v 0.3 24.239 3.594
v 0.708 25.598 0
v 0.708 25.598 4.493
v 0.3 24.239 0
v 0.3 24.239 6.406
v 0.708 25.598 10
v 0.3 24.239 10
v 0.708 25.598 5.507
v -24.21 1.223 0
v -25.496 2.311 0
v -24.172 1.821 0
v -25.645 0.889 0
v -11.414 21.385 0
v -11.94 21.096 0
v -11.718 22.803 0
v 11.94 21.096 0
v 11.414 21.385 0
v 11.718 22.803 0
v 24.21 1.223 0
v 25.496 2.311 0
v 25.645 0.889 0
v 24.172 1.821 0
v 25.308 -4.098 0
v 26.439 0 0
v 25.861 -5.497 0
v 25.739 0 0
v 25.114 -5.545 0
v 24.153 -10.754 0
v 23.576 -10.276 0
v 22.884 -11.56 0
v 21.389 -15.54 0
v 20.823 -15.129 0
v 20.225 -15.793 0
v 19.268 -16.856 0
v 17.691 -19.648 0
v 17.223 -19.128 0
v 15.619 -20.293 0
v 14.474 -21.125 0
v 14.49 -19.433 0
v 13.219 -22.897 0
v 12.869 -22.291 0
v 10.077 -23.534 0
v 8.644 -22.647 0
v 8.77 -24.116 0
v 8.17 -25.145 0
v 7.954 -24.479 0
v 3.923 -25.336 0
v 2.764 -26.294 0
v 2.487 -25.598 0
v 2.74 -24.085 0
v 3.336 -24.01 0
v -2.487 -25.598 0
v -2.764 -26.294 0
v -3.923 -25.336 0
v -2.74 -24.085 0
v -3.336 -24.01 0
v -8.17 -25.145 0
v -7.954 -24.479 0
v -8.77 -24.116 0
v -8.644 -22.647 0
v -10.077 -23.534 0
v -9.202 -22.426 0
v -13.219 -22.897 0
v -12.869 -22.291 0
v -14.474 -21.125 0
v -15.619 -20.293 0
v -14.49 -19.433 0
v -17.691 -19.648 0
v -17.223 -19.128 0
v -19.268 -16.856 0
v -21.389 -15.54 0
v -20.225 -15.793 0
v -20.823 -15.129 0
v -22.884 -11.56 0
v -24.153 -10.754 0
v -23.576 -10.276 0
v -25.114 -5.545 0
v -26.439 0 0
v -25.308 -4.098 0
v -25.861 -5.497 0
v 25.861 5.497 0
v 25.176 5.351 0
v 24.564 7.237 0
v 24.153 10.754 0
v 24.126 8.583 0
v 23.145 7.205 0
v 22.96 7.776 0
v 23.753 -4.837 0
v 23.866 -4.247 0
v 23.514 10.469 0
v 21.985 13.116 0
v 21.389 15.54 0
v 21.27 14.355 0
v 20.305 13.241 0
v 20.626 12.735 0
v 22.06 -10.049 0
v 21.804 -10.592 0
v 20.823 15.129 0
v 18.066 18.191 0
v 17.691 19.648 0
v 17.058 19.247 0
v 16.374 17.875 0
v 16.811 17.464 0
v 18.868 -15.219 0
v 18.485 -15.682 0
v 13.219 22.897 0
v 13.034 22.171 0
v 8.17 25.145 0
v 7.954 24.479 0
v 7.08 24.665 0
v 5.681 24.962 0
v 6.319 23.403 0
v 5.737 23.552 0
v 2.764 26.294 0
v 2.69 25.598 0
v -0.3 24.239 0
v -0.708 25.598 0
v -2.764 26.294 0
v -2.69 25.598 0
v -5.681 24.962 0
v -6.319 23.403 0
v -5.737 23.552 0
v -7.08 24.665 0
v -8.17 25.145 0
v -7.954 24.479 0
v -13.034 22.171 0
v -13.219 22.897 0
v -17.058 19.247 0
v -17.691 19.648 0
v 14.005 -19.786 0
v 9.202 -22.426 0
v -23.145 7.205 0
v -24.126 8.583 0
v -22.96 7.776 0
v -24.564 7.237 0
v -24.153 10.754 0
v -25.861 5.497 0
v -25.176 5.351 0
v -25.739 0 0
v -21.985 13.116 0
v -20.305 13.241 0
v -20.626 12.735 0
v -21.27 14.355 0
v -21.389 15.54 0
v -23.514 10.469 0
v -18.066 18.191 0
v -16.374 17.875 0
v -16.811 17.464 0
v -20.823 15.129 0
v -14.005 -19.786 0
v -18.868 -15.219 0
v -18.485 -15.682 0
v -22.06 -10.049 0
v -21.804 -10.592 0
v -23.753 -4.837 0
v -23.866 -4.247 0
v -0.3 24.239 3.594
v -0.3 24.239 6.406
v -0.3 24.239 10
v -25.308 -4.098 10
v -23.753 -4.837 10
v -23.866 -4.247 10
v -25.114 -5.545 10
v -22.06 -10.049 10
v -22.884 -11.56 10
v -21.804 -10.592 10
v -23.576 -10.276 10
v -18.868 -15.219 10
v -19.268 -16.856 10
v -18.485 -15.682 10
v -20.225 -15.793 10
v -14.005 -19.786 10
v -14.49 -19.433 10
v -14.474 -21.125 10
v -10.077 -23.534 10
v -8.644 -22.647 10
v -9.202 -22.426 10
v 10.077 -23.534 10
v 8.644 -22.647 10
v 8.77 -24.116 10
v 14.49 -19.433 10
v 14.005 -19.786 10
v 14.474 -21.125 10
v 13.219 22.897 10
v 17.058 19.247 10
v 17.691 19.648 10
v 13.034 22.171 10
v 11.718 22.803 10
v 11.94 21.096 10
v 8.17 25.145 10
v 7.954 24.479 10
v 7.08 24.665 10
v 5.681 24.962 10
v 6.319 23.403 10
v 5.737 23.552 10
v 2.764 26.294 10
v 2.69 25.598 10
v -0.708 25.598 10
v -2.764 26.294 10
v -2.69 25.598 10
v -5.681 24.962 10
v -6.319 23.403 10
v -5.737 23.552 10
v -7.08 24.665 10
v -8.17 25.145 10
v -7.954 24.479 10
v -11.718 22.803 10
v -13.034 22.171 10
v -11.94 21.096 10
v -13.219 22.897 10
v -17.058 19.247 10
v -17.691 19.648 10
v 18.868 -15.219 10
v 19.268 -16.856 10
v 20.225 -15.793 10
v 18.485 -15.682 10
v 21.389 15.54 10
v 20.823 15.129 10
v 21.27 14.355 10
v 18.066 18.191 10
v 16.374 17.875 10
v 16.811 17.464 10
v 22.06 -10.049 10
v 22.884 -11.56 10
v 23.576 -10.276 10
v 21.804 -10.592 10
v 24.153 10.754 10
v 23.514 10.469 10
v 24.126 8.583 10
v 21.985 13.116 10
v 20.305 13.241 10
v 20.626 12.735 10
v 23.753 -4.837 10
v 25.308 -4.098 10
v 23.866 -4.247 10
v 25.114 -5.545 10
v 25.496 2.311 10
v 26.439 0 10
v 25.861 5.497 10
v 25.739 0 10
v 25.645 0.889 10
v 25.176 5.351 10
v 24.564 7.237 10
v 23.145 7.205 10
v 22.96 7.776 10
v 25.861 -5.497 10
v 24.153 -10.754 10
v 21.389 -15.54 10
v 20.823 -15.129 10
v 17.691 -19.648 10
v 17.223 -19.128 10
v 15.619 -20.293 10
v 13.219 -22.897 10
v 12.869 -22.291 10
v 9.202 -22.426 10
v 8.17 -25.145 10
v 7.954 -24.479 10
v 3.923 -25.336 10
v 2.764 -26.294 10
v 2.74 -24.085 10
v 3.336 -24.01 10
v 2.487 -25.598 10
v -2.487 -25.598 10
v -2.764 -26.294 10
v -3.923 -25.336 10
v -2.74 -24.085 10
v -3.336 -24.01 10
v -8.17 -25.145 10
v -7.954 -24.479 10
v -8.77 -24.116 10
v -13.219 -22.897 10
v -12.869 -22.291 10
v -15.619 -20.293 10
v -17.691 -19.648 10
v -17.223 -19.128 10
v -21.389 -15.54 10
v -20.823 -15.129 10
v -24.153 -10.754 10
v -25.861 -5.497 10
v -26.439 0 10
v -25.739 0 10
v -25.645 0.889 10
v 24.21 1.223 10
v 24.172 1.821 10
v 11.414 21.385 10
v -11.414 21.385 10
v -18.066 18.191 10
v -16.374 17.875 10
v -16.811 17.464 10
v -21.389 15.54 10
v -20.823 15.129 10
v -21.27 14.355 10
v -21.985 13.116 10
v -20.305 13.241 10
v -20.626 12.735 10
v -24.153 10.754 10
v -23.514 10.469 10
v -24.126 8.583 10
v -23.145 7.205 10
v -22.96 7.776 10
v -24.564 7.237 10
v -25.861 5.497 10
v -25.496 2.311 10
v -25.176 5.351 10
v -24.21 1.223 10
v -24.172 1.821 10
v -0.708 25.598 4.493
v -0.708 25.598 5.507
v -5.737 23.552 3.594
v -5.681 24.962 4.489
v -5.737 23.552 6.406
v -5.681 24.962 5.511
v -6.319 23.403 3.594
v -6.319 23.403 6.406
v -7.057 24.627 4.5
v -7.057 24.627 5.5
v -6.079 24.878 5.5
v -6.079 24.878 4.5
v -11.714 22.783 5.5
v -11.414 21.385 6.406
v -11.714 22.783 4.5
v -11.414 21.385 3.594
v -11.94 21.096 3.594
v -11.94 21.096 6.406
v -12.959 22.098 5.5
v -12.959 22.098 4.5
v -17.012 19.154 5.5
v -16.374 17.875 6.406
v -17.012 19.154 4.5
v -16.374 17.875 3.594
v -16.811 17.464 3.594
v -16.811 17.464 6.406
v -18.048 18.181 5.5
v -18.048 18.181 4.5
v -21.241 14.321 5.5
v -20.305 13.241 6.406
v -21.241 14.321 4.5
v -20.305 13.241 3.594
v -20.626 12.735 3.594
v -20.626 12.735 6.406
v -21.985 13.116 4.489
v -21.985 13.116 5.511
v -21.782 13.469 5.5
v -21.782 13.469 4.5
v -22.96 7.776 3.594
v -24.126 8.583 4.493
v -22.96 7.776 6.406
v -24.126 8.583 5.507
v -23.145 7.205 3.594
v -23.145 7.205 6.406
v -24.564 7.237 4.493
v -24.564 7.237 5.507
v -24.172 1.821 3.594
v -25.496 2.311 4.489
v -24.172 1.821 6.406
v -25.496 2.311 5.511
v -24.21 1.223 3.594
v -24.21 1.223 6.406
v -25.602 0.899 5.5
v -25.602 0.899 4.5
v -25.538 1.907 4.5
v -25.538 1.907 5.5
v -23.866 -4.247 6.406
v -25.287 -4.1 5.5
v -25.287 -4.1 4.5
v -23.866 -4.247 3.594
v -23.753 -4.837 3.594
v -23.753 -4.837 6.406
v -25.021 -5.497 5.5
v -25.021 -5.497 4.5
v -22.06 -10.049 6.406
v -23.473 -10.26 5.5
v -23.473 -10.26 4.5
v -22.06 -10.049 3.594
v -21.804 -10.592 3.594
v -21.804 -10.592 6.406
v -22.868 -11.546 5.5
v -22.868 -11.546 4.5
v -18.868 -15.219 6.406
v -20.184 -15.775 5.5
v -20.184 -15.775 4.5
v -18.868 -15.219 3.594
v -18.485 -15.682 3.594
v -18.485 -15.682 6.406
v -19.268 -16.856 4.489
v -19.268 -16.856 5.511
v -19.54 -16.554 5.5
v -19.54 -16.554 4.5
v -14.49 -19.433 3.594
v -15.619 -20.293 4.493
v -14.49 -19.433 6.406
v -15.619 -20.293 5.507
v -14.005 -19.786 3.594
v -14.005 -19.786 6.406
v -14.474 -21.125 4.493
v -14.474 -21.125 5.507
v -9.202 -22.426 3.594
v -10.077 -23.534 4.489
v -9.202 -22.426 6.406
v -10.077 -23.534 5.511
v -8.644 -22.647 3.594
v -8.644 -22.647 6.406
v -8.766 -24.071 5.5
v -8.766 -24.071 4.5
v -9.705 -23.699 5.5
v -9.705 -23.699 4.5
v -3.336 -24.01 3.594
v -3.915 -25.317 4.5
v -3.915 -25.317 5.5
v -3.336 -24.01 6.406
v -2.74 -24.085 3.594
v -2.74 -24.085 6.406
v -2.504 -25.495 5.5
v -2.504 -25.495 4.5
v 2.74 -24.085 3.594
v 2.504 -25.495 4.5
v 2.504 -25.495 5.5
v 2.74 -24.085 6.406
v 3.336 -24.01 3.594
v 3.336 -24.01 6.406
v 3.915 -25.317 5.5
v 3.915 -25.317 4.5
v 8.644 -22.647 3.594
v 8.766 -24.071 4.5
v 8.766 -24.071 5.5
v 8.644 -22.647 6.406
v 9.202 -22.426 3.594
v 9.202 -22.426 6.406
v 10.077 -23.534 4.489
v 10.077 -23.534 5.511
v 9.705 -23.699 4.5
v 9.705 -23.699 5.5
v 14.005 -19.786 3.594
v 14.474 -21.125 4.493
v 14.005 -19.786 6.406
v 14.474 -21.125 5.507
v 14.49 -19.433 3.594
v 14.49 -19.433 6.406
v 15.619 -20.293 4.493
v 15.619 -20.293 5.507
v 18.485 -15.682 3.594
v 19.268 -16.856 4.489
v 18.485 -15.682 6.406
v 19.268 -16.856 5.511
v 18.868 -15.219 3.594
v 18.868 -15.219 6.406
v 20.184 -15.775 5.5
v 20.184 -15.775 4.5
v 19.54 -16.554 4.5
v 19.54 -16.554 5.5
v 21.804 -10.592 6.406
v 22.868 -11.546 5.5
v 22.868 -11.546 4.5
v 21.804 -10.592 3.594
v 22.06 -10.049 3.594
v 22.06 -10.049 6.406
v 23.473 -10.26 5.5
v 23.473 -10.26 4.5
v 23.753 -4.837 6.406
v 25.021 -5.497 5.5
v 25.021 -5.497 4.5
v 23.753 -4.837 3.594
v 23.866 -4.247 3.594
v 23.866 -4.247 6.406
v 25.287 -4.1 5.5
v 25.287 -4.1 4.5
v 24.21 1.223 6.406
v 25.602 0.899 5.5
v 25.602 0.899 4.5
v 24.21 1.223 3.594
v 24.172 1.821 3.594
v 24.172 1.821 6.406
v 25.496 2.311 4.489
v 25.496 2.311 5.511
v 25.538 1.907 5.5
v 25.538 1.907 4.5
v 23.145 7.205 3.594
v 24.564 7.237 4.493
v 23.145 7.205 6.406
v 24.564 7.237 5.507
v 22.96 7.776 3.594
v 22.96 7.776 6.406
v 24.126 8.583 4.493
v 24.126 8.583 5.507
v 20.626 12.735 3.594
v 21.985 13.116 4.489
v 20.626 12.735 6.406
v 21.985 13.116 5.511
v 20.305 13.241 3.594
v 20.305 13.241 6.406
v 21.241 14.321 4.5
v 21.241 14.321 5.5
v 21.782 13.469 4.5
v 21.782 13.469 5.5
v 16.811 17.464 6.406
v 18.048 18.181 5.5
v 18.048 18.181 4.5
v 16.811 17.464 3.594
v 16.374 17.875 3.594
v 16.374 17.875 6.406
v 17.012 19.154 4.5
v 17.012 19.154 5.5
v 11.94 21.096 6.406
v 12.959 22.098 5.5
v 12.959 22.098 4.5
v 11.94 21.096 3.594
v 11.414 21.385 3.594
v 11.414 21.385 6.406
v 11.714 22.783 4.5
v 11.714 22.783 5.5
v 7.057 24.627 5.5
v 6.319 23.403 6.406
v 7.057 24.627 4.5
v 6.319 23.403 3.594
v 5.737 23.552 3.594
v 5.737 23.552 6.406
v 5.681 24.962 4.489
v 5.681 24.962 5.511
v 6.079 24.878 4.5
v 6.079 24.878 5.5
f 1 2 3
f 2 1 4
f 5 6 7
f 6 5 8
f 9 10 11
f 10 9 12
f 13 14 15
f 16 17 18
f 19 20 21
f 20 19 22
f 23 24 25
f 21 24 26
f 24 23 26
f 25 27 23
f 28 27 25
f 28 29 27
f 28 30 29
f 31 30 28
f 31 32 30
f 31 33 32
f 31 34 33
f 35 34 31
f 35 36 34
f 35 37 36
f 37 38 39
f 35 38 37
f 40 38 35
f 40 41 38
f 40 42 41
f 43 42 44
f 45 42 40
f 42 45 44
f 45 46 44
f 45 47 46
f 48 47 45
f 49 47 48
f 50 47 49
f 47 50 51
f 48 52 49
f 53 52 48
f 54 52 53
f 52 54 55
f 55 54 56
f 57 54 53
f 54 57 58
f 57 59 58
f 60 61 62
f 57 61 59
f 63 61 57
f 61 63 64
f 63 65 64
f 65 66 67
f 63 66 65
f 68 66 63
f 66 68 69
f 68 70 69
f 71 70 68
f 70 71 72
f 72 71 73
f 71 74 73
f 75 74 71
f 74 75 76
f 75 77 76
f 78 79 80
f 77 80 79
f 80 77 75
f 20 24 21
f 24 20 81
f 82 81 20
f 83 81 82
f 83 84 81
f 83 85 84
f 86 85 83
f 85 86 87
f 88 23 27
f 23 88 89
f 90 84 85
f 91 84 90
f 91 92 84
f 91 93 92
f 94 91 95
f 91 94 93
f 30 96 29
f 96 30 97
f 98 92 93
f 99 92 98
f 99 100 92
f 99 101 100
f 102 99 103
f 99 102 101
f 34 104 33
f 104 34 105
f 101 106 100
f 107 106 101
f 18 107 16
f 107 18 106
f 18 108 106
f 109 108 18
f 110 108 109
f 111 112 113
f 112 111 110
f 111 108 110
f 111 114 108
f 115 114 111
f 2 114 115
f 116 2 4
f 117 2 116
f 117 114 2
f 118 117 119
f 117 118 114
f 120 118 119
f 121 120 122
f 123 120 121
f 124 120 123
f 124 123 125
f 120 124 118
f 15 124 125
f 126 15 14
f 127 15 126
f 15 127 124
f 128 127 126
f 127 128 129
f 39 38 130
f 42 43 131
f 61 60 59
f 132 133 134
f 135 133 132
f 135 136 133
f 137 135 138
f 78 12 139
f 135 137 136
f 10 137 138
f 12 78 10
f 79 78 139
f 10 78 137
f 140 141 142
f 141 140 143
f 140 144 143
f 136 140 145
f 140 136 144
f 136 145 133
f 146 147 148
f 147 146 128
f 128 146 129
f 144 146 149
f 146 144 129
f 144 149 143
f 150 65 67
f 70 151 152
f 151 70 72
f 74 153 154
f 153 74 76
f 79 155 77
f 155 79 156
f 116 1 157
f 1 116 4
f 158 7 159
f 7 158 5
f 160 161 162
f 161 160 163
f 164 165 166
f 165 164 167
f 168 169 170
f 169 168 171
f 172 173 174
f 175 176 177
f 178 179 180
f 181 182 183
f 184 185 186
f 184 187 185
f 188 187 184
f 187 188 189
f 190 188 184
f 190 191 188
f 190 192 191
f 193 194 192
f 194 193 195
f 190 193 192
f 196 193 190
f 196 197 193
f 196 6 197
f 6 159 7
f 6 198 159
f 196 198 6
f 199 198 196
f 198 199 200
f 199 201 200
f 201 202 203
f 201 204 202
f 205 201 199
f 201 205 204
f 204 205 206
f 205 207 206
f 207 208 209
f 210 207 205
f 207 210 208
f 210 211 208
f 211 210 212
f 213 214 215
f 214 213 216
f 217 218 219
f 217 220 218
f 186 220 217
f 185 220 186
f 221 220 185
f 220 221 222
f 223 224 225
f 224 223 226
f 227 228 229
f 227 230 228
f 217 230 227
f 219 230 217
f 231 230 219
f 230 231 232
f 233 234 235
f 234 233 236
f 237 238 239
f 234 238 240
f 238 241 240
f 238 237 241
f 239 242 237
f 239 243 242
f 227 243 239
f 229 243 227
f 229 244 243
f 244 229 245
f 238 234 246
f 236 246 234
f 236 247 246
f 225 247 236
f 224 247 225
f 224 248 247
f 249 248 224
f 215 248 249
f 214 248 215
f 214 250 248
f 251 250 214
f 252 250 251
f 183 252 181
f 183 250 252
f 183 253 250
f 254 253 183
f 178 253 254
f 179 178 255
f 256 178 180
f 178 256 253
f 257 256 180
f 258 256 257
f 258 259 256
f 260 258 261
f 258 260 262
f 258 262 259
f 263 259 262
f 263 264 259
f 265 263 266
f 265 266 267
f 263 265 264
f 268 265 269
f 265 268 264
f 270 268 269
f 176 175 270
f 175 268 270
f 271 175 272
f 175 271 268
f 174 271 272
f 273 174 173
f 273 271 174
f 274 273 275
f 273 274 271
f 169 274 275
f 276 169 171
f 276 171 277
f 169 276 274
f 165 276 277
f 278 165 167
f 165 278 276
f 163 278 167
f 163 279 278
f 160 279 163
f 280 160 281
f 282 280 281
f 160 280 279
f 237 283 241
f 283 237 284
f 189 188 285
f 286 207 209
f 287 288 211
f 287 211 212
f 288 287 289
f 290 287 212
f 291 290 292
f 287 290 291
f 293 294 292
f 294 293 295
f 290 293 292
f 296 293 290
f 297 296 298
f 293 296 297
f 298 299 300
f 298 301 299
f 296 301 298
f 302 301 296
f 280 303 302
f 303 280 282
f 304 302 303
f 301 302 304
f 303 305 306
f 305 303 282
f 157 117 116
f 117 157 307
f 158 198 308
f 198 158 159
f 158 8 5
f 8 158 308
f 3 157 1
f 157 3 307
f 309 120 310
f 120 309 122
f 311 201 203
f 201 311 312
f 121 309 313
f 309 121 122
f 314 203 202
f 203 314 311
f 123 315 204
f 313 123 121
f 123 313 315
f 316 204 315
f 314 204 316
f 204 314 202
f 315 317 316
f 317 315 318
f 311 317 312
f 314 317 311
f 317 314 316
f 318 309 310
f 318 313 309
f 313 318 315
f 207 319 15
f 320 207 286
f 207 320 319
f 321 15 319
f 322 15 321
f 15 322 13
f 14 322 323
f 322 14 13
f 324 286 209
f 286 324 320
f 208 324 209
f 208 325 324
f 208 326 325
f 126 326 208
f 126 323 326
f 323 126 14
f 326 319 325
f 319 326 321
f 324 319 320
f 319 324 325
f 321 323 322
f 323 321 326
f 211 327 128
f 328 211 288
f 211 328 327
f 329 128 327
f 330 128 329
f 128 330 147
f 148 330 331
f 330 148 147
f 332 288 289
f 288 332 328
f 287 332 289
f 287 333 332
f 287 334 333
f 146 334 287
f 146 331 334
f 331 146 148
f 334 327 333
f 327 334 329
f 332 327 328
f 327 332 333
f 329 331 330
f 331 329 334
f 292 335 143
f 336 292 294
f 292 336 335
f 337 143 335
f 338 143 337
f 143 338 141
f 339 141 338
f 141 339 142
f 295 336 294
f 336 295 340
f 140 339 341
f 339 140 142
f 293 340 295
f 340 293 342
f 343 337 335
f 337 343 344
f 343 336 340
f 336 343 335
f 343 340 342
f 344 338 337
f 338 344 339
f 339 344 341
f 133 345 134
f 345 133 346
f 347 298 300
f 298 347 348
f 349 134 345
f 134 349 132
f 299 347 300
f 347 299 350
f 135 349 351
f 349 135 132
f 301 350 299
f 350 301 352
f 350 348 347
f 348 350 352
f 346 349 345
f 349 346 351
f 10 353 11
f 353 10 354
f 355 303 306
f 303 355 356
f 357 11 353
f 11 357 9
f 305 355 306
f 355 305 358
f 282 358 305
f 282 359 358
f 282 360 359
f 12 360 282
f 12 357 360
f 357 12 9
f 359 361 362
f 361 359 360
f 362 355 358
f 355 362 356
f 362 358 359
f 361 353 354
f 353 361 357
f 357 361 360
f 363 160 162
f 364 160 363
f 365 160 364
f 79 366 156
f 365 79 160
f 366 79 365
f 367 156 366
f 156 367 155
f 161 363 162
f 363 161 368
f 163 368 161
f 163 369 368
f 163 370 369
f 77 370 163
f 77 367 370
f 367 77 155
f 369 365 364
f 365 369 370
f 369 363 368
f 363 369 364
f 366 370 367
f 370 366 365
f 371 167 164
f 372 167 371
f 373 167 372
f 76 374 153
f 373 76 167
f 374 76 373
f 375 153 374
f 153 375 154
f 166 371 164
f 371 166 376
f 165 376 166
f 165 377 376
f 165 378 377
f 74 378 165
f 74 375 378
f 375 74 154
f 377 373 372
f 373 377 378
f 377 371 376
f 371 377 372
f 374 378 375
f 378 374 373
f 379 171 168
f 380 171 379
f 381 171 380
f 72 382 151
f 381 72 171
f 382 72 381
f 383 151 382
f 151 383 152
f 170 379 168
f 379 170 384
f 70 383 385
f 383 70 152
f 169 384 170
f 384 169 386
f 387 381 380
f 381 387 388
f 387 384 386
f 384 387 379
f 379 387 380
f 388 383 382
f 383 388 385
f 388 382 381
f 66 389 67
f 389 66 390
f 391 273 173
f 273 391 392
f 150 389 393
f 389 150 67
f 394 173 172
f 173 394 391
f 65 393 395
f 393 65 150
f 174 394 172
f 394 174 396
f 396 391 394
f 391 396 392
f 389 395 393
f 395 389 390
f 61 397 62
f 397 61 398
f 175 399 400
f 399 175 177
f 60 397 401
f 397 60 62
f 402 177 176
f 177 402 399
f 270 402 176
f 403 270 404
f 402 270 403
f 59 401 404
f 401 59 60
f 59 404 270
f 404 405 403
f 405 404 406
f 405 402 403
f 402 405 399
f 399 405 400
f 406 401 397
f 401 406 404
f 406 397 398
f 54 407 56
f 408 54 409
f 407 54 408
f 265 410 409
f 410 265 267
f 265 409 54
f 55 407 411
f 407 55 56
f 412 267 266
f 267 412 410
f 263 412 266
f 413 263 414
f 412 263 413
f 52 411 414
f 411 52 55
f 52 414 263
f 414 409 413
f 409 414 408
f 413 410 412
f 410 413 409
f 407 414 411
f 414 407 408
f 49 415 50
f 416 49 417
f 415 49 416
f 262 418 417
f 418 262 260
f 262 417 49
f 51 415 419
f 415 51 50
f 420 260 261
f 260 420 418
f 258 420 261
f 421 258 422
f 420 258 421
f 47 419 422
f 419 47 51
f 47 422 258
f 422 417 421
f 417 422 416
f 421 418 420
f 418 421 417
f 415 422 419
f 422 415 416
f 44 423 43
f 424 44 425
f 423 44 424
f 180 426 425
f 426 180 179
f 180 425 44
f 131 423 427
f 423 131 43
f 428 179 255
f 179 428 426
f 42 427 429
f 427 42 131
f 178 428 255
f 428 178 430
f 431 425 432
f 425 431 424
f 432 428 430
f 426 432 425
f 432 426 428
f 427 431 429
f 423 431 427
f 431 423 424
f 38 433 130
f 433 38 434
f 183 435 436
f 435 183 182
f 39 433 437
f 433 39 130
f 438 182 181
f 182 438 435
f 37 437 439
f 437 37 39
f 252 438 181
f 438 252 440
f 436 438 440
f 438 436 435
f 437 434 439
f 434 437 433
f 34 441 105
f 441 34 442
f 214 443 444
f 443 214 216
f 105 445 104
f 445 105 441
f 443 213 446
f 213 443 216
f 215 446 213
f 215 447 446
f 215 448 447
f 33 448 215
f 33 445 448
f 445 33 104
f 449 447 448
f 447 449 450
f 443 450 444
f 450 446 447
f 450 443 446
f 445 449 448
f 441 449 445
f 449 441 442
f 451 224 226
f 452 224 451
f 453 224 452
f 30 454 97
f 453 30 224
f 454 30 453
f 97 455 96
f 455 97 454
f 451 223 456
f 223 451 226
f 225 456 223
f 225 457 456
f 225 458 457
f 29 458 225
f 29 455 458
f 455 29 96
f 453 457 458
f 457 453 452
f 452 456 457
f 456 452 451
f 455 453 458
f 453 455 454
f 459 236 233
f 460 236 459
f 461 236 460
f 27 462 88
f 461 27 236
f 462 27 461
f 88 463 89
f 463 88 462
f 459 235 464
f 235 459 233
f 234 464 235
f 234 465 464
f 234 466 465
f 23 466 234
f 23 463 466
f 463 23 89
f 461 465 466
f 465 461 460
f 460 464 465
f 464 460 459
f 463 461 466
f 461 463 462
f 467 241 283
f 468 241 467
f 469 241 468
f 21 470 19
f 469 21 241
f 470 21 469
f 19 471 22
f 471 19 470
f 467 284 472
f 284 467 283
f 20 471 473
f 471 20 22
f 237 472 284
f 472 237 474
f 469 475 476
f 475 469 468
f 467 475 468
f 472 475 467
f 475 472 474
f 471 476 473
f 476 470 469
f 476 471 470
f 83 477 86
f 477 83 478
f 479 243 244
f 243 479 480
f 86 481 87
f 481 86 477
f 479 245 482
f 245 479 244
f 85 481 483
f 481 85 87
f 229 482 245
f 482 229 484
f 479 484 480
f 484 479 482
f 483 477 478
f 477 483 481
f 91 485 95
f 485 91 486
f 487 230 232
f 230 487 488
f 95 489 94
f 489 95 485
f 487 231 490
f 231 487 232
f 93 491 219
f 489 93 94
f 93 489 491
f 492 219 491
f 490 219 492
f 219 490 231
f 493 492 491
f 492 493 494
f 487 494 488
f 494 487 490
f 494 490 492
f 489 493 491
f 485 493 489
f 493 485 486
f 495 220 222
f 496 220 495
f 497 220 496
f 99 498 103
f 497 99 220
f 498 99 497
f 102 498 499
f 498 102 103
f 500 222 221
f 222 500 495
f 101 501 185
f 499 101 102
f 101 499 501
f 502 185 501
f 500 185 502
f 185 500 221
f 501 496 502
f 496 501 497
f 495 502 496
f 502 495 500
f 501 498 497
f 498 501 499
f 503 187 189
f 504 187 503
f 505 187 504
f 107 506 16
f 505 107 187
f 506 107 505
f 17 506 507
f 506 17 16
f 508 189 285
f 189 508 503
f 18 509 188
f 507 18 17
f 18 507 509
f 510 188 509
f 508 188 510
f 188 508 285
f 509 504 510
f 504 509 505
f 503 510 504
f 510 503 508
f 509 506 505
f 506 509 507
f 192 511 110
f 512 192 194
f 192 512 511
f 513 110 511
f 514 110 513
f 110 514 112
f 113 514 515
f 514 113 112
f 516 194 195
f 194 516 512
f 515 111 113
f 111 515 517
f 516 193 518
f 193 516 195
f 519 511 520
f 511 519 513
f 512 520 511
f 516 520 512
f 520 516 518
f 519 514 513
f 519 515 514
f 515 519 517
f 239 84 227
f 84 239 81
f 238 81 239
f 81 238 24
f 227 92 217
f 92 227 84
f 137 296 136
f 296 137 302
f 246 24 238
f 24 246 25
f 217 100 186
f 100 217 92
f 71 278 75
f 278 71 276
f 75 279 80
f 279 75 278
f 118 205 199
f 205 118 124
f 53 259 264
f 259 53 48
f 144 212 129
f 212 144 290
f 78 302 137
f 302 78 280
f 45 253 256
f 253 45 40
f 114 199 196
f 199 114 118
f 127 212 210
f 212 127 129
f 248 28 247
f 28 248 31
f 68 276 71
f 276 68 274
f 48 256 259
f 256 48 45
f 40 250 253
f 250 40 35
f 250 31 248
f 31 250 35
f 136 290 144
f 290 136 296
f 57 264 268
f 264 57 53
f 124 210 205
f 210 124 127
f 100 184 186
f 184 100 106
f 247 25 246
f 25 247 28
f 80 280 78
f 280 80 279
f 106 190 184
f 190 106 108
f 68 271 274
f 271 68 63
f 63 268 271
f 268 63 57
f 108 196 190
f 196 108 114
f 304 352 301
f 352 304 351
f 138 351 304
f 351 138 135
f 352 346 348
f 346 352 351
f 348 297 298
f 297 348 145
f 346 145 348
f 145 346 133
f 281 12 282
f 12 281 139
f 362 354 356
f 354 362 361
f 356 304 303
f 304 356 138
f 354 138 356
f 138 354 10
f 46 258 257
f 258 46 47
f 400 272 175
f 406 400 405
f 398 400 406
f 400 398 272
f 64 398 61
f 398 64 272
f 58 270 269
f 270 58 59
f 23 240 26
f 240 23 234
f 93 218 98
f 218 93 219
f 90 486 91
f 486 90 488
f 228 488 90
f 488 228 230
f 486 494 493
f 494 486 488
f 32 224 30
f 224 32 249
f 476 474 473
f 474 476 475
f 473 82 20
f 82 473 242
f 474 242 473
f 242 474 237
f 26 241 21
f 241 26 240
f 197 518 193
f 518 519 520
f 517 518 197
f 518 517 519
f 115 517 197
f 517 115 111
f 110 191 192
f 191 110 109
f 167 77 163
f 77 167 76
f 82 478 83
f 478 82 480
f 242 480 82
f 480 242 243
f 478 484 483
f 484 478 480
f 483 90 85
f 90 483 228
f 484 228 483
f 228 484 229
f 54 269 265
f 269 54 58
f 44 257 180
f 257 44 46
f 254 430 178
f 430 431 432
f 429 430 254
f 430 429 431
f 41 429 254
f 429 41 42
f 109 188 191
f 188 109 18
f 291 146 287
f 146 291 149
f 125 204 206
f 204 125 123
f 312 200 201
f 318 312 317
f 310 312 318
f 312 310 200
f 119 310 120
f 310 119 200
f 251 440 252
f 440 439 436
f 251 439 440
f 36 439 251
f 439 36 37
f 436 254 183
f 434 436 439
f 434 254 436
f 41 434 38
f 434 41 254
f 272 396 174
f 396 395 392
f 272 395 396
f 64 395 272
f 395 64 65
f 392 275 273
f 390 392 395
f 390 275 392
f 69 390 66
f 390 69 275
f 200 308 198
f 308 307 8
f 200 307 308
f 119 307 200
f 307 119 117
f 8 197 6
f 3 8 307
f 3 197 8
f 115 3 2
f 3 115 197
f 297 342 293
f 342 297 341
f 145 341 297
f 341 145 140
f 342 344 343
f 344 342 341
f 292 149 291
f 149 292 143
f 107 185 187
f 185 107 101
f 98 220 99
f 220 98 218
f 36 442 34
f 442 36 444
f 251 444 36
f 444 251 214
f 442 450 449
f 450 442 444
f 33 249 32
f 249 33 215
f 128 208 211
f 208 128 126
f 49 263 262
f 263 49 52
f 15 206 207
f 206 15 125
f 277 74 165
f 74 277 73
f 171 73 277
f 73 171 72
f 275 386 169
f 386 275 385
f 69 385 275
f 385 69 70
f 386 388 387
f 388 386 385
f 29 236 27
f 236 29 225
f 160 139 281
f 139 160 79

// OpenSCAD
$fs = 0.7;

wheelSize = 13;

playLooseFit = 0.2;

trackWidth = 10;
trackThickness = 0.7;
trackTeethSpacing = (wheelSize * 6.2831) / 13;

trackTeethHeight = 1.5;	
trackTeethBaseWidth = 1.5;	
trackTeethTopWidth = 0.6;

trackTeethNoslipBase = 1; 
trackTeethNoslipTop = 3;

module track_basicring(r = 10) render(convexity = 3) {
	difference() {
		cylinder(r = r + trackThickness, h = trackWidth);
		translate([0, 0, -0.1]) cylinder(r = r, h = trackWidth + 0.2);
	}
}

module track_tooth() {
	teethOffset = $teeth_use_offset ? playLooseFit : 0;

	trackTeethBaseWidth = trackTeethBaseWidth + teethOffset * 2;
	trackTeethTopWidth = trackTeethTopWidth + teethOffset * 2;
	trackTeethHeight = trackTeethHeight + teethOffset;

	linear_extrude(height = trackWidth) {
		polygon([	[trackTeethBaseWidth/2, 0],
						[trackTeethTopWidth/2, -trackTeethHeight],
						[-trackTeethTopWidth/2, -trackTeethHeight],
						[-trackTeethBaseWidth/2, 0]]);
	}
}

module track_teeth_noslip(r = 10) {
	teethOffset = $teeth_use_offset ? playLooseFit : 0;

	trackTeethHeight = trackTeethHeight + teethOffset;

	rotate_extrude() {
		polygon([	[r - trackTeethHeight - 0.01, trackTeethNoslipTop/2],
						[r - trackTeethHeight - 0.01, -trackTeethNoslipTop/2],
						[r + 0.01, -trackTeethNoslipBase/2],
						[r + 0.01, trackTeethNoslipBase/2]]);
	}
}

module track_teeth(r = 10, tRadius = -1) {
	tRadius = (tRadius < 0) ? r : tRadius;
	
	trackCircumference = 6.28318 * tRadius;
	teethNum = floor(trackCircumference / trackTeethSpacing);

	intersection() {
		for(i=[0:360/teethNum:360]) rotate([0, 0, i]) render() difference() {
			translate([0, r, 0]) track_tooth();
			translate([0, 0, trackWidth/2]) track_teeth_noslip(r);
		}

		cylinder(r = r + 0.001, h = trackWidth);
	}
}

module track(r = 10, rShrink = 0, clearance_offset = false) {
	$teeth_use_offset = clearance_offset;

	track_teeth(r - rShrink, r);
	track_basicring(r - rShrink);
}

module basic_wheel() render(convexity = 3) {
	difference() {
		cylinder(r = wheelSize, h = trackWidth);
		track(r = wheelSize, clearance_offset = true);
	}
}

module motor_axis() {
	difference() {
		cylinder(d = 5, h = 100);
		translate([2, -5, 0]) cube([5, 10, 100]);
	}
}
	
module motor_wheel() {
	difference() {
		basic_wheel(); 
		translate([0,0, -0.1]) motor_axis();
	}
}

module slipring_wheel() {
	difference() {
		union() {
			basic_wheel();
			translate([0, 0, trackWidth - 0.1]) cylinder(d = 11.5, h = 2);
		}
		translate([0, 0, -0.1]) cylinder(d = 8, h = 100);
		
		for(x = [-1, 1]) translate([x*7.5, 0, -0.1]) cylinder(d = 3, h = 100);
	}
}

track(r = wheelSize + (80)/6.28);
		
